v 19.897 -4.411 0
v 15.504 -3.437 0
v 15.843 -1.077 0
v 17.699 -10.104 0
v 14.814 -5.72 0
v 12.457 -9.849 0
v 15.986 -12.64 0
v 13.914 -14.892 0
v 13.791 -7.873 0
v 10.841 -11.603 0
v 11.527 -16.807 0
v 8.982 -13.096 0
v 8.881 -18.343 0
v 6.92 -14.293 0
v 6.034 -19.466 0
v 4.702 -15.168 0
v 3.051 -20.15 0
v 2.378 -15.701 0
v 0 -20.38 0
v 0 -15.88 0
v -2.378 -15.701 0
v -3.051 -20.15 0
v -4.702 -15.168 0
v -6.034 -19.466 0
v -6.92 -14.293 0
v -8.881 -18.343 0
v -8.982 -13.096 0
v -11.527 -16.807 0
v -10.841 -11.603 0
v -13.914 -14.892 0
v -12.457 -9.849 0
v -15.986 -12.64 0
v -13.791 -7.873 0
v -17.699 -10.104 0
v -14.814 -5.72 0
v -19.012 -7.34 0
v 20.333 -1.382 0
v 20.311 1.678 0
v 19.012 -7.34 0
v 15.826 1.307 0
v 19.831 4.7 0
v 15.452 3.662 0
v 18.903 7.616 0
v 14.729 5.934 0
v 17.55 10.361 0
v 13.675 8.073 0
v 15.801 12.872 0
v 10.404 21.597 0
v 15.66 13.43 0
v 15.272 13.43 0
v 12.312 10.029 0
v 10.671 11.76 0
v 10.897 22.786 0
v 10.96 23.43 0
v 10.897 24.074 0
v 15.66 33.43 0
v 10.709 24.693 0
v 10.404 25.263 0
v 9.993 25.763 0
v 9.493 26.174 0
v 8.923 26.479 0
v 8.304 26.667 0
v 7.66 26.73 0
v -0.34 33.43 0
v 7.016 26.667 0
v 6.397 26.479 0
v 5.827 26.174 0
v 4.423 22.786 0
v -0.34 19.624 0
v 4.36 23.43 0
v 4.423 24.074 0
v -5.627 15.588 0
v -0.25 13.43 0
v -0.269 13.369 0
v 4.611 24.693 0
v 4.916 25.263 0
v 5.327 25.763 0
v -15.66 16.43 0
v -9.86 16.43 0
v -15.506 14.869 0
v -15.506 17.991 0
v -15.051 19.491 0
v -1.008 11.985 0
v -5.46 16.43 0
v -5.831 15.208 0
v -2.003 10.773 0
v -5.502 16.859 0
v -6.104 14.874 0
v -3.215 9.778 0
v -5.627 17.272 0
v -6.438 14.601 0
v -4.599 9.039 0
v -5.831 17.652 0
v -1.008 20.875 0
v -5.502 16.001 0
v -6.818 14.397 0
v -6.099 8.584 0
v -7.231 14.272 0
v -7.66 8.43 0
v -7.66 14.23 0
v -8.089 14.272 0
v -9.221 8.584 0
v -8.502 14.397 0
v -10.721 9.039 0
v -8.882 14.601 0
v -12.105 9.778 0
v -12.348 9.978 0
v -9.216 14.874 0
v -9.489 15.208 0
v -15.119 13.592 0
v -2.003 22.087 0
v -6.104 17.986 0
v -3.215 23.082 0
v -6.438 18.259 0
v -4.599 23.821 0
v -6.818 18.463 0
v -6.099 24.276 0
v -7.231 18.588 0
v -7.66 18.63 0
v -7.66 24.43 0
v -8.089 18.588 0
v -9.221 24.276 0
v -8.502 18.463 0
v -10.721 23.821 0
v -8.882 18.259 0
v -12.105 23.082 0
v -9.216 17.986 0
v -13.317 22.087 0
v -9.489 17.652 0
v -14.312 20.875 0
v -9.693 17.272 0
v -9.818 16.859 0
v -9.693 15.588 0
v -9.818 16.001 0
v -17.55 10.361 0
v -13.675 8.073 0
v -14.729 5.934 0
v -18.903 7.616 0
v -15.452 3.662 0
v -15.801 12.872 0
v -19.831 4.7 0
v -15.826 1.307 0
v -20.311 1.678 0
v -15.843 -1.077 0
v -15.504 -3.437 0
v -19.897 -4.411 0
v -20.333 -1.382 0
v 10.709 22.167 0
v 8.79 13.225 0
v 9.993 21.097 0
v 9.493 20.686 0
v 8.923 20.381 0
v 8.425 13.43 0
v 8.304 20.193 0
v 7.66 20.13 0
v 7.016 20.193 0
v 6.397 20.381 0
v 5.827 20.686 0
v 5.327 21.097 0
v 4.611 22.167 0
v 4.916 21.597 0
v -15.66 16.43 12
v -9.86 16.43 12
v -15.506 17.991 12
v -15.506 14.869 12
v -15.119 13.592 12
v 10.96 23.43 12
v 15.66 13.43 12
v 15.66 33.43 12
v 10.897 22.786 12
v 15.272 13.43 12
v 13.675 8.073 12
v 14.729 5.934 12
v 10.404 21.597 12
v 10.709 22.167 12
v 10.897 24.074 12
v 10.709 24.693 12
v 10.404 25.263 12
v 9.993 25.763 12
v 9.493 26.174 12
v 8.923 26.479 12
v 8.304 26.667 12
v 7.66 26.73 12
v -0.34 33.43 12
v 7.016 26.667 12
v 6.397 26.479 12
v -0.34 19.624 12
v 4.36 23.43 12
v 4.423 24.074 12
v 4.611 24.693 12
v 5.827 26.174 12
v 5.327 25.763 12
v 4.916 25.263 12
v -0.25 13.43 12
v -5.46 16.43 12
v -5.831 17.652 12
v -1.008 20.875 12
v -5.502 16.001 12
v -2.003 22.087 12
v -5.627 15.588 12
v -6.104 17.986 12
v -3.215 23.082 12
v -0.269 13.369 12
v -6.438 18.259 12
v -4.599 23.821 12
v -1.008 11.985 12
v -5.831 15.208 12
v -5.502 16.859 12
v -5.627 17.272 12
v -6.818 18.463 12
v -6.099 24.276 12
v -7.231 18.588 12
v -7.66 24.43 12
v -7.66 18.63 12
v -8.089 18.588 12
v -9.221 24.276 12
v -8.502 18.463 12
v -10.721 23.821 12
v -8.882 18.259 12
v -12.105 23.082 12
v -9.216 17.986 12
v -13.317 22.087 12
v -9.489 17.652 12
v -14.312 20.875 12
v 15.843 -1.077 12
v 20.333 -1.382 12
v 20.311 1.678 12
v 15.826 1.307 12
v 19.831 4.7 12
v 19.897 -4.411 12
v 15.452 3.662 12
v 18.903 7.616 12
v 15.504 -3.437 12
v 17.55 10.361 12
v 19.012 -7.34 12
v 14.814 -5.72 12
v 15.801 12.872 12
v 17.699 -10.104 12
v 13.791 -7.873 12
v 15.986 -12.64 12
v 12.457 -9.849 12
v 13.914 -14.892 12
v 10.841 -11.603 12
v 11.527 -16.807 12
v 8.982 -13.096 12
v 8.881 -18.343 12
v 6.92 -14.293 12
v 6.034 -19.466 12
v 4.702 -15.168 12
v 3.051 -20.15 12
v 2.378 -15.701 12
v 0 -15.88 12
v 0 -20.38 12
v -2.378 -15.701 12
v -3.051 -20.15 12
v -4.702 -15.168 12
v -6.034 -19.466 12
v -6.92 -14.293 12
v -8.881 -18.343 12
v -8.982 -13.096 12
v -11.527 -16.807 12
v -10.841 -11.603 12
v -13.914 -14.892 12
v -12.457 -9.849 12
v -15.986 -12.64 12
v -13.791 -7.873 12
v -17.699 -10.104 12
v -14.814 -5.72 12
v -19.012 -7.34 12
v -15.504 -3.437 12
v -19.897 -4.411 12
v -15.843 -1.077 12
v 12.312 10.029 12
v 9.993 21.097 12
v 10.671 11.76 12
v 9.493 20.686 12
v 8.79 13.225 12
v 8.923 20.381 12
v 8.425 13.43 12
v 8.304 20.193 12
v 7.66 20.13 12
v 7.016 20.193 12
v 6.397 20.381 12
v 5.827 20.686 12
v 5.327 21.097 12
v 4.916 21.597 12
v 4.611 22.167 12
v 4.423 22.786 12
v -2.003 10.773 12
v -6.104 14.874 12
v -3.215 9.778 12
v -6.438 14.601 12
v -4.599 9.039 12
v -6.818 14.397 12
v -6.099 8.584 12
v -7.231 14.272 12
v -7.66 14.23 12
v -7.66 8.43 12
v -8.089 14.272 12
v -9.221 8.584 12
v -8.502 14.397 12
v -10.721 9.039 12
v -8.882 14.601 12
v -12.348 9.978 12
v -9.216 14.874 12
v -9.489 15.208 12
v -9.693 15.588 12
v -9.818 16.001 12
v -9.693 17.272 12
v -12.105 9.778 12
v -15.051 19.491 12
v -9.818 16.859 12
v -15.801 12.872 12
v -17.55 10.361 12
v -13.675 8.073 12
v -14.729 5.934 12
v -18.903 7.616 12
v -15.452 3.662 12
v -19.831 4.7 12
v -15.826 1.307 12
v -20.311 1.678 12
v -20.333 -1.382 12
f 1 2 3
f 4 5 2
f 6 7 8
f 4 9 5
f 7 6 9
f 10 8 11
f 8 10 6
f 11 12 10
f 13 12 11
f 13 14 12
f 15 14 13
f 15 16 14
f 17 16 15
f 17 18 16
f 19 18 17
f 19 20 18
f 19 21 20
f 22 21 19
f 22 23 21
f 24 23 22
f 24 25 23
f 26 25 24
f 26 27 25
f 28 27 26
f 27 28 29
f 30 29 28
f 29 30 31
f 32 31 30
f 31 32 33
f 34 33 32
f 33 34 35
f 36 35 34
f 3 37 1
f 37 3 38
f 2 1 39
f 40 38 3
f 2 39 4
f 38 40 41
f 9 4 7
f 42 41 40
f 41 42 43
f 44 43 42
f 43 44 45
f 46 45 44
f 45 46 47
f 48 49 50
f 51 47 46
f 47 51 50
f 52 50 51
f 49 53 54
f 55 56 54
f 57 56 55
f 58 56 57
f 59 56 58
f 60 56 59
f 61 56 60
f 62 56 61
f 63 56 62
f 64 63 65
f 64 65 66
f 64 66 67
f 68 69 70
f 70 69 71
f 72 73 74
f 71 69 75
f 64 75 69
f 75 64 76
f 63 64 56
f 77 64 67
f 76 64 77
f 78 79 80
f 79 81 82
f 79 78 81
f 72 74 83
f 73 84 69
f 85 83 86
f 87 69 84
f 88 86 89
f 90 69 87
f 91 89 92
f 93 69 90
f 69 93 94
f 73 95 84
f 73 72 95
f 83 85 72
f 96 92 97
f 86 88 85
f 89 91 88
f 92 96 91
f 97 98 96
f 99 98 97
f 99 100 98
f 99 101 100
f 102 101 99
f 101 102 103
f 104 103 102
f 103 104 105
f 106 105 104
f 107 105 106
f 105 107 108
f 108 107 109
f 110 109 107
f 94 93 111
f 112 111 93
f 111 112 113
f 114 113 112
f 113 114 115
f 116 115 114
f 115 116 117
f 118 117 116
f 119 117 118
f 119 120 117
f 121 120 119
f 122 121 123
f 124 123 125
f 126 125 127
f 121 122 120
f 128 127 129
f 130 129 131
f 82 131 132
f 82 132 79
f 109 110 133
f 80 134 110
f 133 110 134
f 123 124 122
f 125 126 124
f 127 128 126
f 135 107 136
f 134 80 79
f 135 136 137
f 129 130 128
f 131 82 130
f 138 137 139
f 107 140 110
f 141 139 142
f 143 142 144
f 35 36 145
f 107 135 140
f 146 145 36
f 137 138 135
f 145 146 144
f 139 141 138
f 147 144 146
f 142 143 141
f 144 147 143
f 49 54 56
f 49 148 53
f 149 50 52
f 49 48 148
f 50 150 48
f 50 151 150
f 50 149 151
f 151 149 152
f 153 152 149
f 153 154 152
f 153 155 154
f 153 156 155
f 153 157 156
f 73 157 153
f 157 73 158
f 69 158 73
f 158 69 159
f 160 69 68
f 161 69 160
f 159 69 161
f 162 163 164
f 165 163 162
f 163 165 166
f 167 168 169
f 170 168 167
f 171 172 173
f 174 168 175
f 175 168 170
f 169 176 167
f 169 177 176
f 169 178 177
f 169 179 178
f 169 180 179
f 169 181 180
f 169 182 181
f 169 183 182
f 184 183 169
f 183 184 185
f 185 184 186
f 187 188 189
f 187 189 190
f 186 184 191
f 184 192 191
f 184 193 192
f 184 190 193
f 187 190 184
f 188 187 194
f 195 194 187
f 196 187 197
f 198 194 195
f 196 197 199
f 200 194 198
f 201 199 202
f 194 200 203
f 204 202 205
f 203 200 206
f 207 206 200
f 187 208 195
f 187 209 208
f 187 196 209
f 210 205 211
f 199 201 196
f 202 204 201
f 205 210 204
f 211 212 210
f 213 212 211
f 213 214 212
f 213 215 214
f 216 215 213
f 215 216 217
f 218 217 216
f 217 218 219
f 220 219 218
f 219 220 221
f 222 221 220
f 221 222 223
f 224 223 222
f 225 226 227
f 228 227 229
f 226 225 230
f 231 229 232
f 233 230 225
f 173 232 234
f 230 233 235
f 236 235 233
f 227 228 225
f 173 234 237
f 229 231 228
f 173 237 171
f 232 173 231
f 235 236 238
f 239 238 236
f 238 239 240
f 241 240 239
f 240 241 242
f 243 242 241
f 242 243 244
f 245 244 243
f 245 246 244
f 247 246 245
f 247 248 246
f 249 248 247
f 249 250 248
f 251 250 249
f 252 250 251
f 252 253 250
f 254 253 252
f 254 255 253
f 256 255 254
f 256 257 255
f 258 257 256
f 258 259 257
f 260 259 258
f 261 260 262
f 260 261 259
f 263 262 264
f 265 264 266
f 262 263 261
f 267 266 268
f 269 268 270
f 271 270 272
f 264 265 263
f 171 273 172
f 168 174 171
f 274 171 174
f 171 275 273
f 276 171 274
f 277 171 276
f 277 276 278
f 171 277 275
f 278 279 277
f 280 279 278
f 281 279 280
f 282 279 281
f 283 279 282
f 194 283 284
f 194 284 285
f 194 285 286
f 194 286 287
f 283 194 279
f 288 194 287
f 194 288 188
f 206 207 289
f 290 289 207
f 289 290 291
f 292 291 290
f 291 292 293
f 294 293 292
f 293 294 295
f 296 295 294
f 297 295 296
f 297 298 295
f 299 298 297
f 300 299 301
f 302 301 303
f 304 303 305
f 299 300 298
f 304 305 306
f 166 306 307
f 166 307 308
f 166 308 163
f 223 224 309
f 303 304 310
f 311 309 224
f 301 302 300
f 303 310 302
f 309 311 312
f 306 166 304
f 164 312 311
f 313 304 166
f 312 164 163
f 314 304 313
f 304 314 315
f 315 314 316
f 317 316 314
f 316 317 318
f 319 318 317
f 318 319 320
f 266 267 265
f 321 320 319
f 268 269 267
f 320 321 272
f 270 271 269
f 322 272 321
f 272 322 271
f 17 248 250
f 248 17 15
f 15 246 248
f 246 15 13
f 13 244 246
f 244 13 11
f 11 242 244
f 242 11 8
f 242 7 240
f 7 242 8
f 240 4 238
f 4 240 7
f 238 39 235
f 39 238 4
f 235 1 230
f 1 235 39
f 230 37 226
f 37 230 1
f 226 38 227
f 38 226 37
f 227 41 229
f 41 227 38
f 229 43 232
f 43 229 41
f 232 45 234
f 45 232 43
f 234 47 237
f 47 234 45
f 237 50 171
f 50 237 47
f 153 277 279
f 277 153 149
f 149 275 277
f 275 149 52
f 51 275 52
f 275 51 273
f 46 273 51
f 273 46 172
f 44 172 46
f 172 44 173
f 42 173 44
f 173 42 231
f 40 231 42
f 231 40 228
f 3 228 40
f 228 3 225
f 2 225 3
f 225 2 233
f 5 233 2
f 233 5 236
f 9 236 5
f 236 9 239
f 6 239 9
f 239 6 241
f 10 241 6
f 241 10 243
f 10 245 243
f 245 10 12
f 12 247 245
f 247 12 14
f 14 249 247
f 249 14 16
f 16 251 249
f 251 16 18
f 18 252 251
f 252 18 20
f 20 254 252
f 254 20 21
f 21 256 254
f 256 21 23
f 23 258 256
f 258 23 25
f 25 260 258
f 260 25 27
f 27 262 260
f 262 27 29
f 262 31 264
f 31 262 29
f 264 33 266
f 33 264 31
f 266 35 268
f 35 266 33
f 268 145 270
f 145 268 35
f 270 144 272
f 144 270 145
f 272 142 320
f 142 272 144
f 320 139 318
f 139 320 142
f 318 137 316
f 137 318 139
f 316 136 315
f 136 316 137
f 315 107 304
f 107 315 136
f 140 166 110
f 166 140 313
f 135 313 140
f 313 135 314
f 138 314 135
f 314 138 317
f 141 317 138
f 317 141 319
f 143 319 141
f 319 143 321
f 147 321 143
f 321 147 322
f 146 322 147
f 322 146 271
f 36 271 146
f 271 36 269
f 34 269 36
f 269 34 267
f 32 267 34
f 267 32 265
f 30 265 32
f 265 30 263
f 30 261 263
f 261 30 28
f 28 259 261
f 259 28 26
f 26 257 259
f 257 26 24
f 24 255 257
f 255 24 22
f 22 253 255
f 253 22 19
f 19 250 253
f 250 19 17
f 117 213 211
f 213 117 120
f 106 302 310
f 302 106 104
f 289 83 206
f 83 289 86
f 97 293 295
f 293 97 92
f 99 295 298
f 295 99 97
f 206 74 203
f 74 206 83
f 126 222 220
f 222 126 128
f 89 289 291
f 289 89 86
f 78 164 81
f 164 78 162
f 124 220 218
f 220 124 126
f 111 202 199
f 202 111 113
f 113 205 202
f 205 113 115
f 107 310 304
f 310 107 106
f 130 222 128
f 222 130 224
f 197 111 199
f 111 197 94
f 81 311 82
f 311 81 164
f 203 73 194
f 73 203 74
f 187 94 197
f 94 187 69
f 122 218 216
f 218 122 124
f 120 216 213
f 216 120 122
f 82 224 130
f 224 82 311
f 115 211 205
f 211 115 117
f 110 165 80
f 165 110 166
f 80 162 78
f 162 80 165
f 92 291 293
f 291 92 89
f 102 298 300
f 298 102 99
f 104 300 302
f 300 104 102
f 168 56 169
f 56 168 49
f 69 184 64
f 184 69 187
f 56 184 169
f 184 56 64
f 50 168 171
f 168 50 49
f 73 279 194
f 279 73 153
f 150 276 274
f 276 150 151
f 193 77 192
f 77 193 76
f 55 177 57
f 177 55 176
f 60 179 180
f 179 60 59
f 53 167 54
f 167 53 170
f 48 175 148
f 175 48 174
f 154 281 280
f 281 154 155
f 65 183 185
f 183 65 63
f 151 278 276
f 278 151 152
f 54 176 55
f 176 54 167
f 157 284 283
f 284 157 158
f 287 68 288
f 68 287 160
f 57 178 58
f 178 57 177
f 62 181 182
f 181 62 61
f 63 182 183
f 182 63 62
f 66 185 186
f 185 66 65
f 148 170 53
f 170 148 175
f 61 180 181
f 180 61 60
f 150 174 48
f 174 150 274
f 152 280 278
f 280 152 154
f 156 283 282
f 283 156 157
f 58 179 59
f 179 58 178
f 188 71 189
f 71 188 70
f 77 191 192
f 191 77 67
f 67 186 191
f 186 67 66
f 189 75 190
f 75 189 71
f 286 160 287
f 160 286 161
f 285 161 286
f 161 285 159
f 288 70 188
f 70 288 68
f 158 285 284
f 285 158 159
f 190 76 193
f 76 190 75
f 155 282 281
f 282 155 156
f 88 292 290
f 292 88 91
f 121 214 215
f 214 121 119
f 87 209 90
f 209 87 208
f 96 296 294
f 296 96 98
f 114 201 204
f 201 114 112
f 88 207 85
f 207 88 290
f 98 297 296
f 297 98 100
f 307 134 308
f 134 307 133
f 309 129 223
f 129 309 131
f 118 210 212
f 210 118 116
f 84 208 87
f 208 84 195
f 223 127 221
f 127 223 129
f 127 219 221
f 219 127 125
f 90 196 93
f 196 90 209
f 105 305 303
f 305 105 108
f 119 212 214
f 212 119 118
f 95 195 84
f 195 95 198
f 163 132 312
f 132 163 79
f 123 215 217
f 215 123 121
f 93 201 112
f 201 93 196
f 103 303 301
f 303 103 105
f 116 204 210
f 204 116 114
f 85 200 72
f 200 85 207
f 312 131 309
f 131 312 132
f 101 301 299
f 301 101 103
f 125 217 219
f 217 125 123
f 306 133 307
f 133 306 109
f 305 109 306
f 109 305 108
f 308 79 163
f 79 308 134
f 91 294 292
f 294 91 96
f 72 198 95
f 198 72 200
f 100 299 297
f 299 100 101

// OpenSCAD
$fn = 32;

// ----------------------------------------------------------------------
// Pipe clamp: 40.76 mm ring, 4.5 mm wall, 12 mm wide
// ----------------------------------------------------------------------

// --- parameters (mm) ---
outer_r = 20.38;          // clamp outside radius
inner_r = 15.88;          // pipe bore radius
band = 4.5;               // band thickness
clamp_w = 12;             // clamp width
opening = 50;             // opening angle between the ends
lug_w = 16;               // lug width
lug_len = 20;             // lug length
bolt_d = 6.6;             // bolt hole
knuckle_d = 16;           // hinge knuckle diameter
pin_d = 4.4;              // hinge pin hole

clamp_profile = [[-8.613, 18.471], [-11.281, 16.973], [-13.696, 15.092], [-15.801, 12.872], [-17.55, 10.361], [-18.903, 7.616], [-19.831, 4.7], [-20.311, 1.678], [-20.333, -1.382], [-19.897, -4.411], [-19.012, -7.34], [-17.699, -10.104], [-15.986, -12.64], [-13.914, -14.892], [-11.527, -16.807], [-8.881, -18.343], [-6.034, -19.466], [-3.051, -20.15], [0, -20.38], [3.051, -20.15], [6.034, -19.466], [8.881, -18.343], [11.527, -16.807], [13.914, -14.892], [15.986, -12.64], [17.699, -10.104], [19.012, -7.34], [19.897, -4.411], [20.333, -1.382], [20.311, 1.678], [19.831, 4.7], [18.903, 7.616], [17.55, 10.361], [15.801, 12.872], [13.696, 15.092], [11.281, 16.973], [8.613, 18.471], [6.711, 14.392], [8.79, 13.225], [10.671, 11.76], [12.312, 10.029], [13.675, 8.073], [14.729, 5.934], [15.452, 3.662], [15.826, 1.307], [15.843, -1.077], [15.504, -3.437], [14.814, -5.72], [13.791, -7.873], [12.457, -9.849], [10.841, -11.603], [8.982, -13.096], [6.92, -14.293], [4.702, -15.168], [2.378, -15.701], [0, -15.88], [-2.378, -15.701], [-4.702, -15.168], [-6.92, -14.293], [-8.982, -13.096], [-10.841, -11.603], [-12.457, -9.849], [-13.791, -7.873], [-14.814, -5.72], [-15.504, -3.437], [-15.843, -1.077], [-15.826, 1.307], [-15.452, 3.662], [-14.729, 5.934], [-13.675, 8.073], [-12.312, 10.029], [-10.671, 11.76], [-8.79, 13.225], [-6.711, 14.392]];

difference() {
  union() {
    linear_extrude(height = clamp_w) polygon(clamp_profile);
    /* hinge knuckle, sunk 2 mm into the band end */
    translate([-7.66, 16.43, 0]) cylinder(h = clamp_w, d = knuckle_d);
    /* bolt lug on the other end */
    translate([-0.34, 13.43, 0]) cube([lug_w, 20, clamp_w]);
  }
  translate([7.66, 23.43, -2.5]) cylinder(h = clamp_w + 5, d = bolt_d);
  translate([-7.66, 16.43, -2.5]) cylinder(h = clamp_w + 5, d = pin_d);
}
